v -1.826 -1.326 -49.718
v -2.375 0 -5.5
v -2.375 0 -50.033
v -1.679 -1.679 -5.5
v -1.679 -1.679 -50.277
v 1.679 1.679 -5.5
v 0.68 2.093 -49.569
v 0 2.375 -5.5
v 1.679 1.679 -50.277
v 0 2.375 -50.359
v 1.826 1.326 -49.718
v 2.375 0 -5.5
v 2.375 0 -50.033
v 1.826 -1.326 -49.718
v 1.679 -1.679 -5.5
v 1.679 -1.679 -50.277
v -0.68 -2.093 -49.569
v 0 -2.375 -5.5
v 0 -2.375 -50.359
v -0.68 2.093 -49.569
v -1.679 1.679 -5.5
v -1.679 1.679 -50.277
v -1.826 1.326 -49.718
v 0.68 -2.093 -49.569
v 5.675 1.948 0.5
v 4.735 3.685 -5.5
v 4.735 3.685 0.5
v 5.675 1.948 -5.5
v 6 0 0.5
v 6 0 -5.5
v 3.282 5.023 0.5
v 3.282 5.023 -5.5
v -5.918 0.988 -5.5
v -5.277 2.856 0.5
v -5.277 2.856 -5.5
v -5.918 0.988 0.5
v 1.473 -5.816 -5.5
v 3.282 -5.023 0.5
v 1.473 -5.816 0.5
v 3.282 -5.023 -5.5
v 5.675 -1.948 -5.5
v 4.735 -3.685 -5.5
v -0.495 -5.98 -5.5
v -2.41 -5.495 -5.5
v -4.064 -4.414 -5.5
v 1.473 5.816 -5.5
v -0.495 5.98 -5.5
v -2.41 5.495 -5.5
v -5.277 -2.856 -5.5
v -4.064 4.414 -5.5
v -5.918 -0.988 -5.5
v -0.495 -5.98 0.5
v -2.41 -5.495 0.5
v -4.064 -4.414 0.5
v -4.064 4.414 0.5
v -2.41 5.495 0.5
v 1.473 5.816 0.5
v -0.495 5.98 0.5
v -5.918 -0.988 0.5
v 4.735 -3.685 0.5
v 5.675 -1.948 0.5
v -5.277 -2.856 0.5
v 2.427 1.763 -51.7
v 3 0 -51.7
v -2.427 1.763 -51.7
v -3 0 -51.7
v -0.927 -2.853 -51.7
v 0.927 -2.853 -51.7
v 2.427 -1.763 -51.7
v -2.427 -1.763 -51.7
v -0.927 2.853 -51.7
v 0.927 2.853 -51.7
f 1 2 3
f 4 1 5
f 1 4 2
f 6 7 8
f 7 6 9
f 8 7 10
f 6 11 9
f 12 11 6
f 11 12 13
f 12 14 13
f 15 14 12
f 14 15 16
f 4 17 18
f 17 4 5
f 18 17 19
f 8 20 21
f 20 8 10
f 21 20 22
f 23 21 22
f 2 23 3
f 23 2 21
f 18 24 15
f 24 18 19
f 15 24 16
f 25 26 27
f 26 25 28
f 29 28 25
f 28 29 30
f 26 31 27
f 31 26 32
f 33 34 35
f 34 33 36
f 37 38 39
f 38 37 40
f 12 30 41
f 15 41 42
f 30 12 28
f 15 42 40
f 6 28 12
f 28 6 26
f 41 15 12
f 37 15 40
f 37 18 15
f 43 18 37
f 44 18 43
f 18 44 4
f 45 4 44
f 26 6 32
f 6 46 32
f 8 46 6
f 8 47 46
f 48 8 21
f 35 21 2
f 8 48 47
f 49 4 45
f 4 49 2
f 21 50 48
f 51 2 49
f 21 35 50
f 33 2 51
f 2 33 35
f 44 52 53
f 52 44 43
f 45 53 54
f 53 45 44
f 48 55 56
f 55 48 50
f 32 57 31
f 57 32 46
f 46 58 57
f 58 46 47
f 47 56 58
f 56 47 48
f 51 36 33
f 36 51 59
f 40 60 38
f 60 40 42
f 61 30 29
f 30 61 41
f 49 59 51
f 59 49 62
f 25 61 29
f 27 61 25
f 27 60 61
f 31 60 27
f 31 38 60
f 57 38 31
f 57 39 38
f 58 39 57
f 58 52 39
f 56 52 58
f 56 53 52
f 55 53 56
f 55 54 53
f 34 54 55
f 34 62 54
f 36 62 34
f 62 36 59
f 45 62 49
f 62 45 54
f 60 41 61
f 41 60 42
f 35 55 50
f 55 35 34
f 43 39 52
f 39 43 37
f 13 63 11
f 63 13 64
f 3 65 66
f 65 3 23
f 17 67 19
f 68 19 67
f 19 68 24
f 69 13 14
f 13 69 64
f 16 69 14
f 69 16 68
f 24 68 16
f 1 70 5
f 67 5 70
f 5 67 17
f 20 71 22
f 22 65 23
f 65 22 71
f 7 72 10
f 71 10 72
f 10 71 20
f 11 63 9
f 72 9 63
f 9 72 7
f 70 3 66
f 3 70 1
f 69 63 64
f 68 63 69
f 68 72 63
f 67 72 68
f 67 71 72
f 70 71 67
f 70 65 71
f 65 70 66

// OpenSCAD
// Parameters
total_length_mm = 51.2; //[25.6:102.4:0.1]
barrel_diameter_mm = 4.75; //[2.4:9.5:0.05]
filament_diameter_mm = 1.75; //[1.0:3.0:0.05]
filament_clearance_mm = 0.2; //[0.0:0.6:0.05]
filament_bore_diameter_mm = 1.95; //[1.2:3.5:0.05]
mount_diameter_mm = 12; //[6:24:0.1]
mount_height_mm = 6; //[3:12:0.1]
nozzle_tip_diameter_mm = 6; //[3:12:0.1]
nozzle_tip_height_mm = 8; //[4:16:0.1]
connection_overlap_mm = 1; //[0.5:2:0.1]
bore_extra_length_mm = 2; //[1:6:0.1]

// Hot End - complete geometry
module hot_end() {
  color("DimGray") {
    // Main cylindrical barrel
    translate([0, 0, -total_length_mm/2])
      cylinder(r=barrel_diameter_mm/2, h=total_length_mm, center=true);
  }
}

// E3D Hot End Assembly - complete geometry
module e3d_hot_end_assembly() {
  color("Silver") {
    // Mounting interface placeholder
    translate([0, 0, -mount_height_mm/2 + connection_overlap_mm/2])
      cylinder(r=mount_diameter_mm/2, h=mount_height_mm, center=true);
  }
}

// E3D Hot End - complete geometry
module e3d_hot_end() {
  color("Black") {
    // Nozzle/tip placeholder
    translate([0, 0, -total_length_mm + nozzle_tip_height_mm/2 - connection_overlap_mm/2])
      cylinder(r1=nozzle_tip_diameter_mm/2, r2=0, h=nozzle_tip_height_mm, center=true);
  }
}

// Jhead Hot End Assembly - complete geometry
module jhead_hot_end_assembly() {
  color("Silver") {
    // Mounting interface placeholder
    translate([0, 0, -mount_height_mm/2 + connection_overlap_mm/2])
      cylinder(r=mount_diameter_mm/2, h=mount_height_mm, center=true);
  }
}

// Jhead Hot End - complete geometry
module jhead_hot_end() {
  color("Black") {
    // Nozzle/tip placeholder
    translate([0, 0, -total_length_mm + nozzle_tip_height_mm/2 - connection_overlap_mm/2])
      cylinder(r1=nozzle_tip_diameter_mm/2, r2=0, h=nozzle_tip_height_mm, center=true);
  }
}

// Assembly
module assembly() {
  union() {
    hot_end();
    e3d_hot_end_assembly();
    e3d_hot_end();
    jhead_hot_end_assembly();
    jhead_hot_end();
  }
}

assembly();
